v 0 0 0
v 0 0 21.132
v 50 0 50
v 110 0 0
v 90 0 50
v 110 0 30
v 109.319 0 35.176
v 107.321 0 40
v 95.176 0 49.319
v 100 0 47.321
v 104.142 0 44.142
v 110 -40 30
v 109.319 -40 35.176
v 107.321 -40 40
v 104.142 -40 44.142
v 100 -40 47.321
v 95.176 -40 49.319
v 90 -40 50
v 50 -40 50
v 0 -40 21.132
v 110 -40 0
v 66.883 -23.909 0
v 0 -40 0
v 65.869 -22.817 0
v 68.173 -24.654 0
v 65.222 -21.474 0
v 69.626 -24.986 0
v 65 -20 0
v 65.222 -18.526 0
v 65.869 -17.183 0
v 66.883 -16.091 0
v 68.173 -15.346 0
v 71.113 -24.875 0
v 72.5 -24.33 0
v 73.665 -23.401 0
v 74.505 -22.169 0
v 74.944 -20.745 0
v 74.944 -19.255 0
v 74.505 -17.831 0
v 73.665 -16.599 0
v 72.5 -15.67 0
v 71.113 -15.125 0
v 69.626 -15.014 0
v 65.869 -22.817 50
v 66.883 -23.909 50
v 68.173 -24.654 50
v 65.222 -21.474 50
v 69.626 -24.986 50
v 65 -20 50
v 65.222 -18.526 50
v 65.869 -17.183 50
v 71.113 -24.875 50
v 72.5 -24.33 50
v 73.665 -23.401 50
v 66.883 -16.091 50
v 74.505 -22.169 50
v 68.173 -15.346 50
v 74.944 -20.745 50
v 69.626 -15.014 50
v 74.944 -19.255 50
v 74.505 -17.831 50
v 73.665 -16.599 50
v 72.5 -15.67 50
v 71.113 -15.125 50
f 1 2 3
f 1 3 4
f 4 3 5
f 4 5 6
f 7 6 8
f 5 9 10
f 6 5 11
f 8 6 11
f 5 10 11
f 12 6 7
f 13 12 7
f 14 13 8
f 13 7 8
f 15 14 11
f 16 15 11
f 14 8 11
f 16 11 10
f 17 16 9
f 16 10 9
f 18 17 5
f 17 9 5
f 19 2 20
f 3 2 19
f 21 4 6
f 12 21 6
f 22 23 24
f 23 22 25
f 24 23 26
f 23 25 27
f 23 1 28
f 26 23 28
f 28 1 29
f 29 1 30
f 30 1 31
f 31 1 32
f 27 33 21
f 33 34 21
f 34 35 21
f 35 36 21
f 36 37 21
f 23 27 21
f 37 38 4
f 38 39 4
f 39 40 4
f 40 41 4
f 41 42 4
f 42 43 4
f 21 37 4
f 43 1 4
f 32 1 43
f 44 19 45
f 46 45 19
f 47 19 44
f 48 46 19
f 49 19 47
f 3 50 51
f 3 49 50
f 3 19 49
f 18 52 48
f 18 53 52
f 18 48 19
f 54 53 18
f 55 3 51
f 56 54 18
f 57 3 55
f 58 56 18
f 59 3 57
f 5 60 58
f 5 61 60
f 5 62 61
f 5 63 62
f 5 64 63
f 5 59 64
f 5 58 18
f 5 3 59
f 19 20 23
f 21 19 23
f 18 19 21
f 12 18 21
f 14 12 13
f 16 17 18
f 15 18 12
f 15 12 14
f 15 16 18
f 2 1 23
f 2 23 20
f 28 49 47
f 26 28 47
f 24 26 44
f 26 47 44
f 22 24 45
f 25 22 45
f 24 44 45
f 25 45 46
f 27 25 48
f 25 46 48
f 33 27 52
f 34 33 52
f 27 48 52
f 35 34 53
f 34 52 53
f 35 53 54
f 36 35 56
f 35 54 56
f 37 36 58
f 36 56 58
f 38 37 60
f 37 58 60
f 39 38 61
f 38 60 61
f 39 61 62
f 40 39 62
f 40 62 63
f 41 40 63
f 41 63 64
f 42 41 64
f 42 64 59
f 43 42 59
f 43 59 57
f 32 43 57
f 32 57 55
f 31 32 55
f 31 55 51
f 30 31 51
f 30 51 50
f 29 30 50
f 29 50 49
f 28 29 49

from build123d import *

# Parameters (mm, degrees)
PAD_DEPTH    = 40
SKETCH001_R  = 5
POCKET_DEPTH = 50.001


with BuildPart() as part:
    # Sketch → Pad (new body)
    with BuildSketch(Plane.XZ):
        with BuildLine():
            Line((0, 0), (110, 0))
            Line((110, 0), (110, 30))
            ThreePointArc((110, 30), (104.142136, 44.142136), (90, 50))
            Line((50, 50), (90, 50))
            Line((0, 21.132487), (50, 50))
            Line((0, 0), (0, 21.132487))
        make_face()
    extrude(amount=PAD_DEPTH)

    # Sketch001 (on Face4 of Pad) → Pocket (cut, through all)
    with BuildSketch(Plane(origin=(0, 0, 50), x_dir=(-1, 0, 0), z_dir=(0, 0, 1))):
        with Locations((-70, 20)):
            Circle(SKETCH001_R)
    extrude(amount=-POCKET_DEPTH, mode=Mode.SUBTRACT)


solid = part.part
